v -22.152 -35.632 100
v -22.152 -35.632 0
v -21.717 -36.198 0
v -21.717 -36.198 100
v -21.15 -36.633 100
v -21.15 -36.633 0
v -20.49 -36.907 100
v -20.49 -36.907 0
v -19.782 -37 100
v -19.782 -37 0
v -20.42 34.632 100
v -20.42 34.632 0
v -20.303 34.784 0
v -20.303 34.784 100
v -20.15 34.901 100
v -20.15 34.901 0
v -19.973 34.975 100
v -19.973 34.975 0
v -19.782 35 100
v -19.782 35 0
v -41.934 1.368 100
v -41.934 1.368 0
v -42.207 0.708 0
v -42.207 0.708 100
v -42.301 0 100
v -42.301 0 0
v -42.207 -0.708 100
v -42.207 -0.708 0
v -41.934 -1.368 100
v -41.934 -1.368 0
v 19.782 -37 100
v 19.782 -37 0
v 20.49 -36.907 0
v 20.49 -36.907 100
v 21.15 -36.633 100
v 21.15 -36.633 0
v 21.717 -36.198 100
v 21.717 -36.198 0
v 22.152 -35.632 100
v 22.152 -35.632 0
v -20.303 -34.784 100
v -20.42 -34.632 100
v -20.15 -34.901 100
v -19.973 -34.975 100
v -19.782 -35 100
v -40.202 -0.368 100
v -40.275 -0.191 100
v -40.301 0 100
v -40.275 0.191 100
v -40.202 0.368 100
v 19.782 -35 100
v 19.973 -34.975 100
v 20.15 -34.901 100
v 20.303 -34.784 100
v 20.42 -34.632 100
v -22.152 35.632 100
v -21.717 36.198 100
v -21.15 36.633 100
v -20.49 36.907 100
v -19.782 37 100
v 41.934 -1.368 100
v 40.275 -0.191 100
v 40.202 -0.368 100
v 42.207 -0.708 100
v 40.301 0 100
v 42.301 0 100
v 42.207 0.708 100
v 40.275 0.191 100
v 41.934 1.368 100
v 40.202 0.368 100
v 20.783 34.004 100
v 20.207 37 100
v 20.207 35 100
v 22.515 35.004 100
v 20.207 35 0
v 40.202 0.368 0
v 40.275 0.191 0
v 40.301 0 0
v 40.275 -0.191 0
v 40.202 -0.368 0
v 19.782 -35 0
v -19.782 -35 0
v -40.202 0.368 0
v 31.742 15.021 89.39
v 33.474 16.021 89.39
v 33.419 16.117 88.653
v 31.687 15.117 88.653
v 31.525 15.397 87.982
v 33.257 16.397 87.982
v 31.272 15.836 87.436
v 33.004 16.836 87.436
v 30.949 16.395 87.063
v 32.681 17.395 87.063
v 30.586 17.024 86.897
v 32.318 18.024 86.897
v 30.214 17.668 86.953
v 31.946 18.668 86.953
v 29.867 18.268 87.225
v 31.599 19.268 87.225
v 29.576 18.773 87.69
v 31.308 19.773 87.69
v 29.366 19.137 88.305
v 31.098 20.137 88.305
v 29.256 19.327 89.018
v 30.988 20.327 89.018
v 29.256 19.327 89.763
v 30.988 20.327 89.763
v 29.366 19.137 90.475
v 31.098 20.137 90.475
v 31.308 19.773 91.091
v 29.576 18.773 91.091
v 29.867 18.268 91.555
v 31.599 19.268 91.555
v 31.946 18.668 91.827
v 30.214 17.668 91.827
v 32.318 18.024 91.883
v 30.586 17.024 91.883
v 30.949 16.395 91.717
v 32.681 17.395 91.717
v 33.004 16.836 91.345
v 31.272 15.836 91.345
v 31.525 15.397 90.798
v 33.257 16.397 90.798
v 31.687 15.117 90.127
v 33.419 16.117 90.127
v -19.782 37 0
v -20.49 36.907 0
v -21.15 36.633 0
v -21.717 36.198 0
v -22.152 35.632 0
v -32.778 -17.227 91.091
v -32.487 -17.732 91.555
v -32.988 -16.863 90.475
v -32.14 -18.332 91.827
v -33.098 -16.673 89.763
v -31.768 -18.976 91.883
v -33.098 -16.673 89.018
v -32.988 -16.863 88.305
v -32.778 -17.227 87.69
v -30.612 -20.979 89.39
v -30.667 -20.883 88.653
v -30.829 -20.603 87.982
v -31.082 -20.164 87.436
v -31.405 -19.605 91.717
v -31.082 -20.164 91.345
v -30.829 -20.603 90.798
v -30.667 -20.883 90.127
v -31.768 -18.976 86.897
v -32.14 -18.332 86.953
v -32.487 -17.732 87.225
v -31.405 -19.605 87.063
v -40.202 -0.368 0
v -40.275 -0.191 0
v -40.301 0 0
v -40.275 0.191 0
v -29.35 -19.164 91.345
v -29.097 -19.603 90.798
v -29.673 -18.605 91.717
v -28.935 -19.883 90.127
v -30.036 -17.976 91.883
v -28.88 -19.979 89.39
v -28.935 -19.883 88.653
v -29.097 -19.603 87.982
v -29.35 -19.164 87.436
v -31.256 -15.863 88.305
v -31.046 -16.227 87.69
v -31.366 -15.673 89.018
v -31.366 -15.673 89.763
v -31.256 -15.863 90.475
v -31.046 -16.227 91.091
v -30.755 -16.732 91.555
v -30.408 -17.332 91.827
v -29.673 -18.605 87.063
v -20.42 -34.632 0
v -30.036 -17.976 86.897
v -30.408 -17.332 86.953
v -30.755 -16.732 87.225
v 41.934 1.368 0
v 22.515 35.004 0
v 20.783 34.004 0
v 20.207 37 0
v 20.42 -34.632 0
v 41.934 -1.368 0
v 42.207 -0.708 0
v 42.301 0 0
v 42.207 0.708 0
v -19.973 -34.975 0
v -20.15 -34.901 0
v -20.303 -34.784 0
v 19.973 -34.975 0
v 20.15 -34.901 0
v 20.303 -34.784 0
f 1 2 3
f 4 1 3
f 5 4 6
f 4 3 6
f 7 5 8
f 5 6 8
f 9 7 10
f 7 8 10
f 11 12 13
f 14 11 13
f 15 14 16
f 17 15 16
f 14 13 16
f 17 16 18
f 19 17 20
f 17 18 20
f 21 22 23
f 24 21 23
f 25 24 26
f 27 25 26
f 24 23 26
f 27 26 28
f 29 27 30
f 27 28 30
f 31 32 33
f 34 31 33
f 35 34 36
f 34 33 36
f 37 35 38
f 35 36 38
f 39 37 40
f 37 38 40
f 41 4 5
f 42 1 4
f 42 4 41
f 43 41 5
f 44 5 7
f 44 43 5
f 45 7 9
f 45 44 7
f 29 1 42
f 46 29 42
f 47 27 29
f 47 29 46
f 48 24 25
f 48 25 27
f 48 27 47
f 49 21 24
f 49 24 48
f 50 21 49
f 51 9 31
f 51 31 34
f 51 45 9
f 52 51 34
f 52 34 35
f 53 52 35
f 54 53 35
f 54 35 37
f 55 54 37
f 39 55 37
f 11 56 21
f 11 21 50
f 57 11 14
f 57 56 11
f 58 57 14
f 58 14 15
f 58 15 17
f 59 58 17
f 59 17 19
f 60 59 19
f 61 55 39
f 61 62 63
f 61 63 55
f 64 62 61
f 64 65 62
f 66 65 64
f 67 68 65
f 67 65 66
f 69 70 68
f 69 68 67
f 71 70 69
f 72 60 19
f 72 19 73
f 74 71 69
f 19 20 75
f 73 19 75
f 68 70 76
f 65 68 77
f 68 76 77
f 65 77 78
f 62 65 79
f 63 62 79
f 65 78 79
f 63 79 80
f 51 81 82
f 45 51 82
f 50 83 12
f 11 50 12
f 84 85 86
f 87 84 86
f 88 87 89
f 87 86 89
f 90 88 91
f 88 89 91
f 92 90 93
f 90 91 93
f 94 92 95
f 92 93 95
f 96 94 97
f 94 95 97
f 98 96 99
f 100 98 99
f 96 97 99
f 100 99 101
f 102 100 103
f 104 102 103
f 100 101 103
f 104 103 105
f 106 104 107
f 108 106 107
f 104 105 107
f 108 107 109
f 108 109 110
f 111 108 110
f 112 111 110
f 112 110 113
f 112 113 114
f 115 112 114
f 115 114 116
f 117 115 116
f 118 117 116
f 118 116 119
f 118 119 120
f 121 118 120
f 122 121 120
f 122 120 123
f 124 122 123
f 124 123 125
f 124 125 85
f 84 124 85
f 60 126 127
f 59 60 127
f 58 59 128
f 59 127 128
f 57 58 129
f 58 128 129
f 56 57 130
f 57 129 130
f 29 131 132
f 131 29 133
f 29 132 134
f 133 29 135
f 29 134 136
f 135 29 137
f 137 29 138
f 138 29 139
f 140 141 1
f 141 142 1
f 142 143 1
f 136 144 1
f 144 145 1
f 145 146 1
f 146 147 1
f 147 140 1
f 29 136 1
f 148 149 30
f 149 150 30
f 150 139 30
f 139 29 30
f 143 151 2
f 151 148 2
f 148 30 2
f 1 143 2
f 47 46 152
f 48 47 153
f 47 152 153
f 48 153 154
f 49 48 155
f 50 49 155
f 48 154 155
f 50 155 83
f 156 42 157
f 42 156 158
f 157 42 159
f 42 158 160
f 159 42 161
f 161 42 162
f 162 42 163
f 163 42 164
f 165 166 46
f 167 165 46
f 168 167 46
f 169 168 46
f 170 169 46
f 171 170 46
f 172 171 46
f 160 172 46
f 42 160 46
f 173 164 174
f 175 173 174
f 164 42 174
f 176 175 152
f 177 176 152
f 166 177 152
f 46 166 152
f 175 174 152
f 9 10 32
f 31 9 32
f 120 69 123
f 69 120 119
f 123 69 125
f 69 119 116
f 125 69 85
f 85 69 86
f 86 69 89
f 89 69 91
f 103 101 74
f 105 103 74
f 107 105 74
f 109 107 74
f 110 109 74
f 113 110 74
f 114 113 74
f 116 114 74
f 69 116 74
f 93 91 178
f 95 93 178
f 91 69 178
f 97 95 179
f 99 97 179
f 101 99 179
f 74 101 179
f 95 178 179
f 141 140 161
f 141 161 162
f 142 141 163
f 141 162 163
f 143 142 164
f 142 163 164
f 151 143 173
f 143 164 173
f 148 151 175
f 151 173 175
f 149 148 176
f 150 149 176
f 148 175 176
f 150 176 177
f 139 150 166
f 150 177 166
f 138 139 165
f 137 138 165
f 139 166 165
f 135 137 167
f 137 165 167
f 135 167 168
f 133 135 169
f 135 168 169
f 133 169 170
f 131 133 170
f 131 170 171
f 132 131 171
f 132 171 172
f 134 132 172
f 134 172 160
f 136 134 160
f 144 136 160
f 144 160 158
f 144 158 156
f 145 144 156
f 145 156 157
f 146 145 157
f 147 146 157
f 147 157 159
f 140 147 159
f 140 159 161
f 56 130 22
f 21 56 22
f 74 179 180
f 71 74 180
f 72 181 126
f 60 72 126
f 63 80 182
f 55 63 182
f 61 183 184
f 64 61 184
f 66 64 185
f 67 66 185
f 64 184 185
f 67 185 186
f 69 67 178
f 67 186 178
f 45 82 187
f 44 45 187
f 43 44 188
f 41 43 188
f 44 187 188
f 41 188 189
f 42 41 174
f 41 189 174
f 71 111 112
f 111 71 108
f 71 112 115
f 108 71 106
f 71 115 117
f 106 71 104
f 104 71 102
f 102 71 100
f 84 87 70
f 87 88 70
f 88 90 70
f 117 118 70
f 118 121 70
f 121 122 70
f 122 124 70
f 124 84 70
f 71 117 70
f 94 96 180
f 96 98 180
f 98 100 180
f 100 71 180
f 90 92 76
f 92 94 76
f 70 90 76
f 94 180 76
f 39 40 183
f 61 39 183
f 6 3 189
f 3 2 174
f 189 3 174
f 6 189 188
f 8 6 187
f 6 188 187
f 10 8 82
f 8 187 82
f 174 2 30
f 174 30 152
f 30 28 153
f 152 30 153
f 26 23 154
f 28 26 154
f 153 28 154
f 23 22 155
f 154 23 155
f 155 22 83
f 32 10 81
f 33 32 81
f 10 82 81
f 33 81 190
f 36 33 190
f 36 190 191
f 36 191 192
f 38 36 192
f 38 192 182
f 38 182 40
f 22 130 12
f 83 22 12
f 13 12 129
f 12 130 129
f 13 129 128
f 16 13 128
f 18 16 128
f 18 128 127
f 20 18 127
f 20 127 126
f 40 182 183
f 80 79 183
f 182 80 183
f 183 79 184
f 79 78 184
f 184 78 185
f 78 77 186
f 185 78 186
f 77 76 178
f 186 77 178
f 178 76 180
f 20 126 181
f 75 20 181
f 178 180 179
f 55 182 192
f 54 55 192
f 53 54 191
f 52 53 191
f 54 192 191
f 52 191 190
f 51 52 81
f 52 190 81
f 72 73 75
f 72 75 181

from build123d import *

# Parameters (mm, degrees)
LOFTED_BENDS1_DEPTH = 100
SKETCH11_R          = 2.5
CUT_EXTRUDE1_DEPTH  = 137.408236331


# Read off the part's stored shape, not the designer's step: Lofted Bends1
with BuildPart() as part:
    # Lofted Bends1 outline → Lofted Bends1 (new body)
    with BuildSketch(Plane.XY):
        with BuildLine():
            Line((20.207259422, 35), (20.207259422, 37))
            Line((20.207259422, 37), (-19.781983213, 37))
            ThreePointArc((-19.781983213, 37), (-21.150283213, 36.63336512), (-22.151948333, 35.6317))
            Line((-22.151948333, 35.6317), (-41.933931547, 1.3683))
            ThreePointArc((-41.933931547, 1.3683), (-42.300566427, 0), (-41.933931547, -1.3683))
            Line((-41.933931547, -1.3683), (-22.151948333, -35.6317))
            ThreePointArc((-22.151948333, -35.6317), (-21.150283213, -36.63336512), (-19.781983213, -37))
            Line((-19.781983213, -37), (19.781983213, -37))
            ThreePointArc((19.781983213, -37), (21.150283213, -36.63336512), (22.151948333, -35.6317))
            Line((22.151948333, -35.6317), (41.933931547, -1.3683))
            ThreePointArc((41.933931547, -1.3683), (42.300566427, 0), (41.933931547, 1.3683))
            Line((41.933931547, 1.3683), (22.514616839, 35.003539722))
            Line((22.514616839, 35.003539722), (20.782566032, 34.003539722))
            Line((20.782566032, 34.003539722), (40.201880739, 0.3683))
            ThreePointArc((40.201880739, 0.3683), (40.300566427, 0), (40.201880739, -0.3683))
            Line((40.201880739, -0.3683), (20.419897526, -34.6317))
            ThreePointArc((20.419897526, -34.6317), (20.150283213, -34.901314312), (19.781983213, -35))
            Line((19.781983213, -35), (-19.781983213, -35))
            ThreePointArc((-19.781983213, -35), (-20.150283213, -34.901314312), (-20.419897526, -34.6317))
            Line((-20.419897526, -34.6317), (-40.201880739, -0.3683))
            ThreePointArc((-40.201880739, -0.3683), (-40.300566427, 0), (-40.201880739, 0.3683))
            Line((-40.201880739, 0.3683), (-20.419897526, 34.6317))
            ThreePointArc((-20.419897526, 34.6317), (-20.150283213, 34.901314312), (-19.781983213, 35))
            Line((-19.781983213, 35), (20.207259422, 35))
        make_face()
    extrude(amount=LOFTED_BENDS1_DEPTH)

    # Sketch11 → Cut-Extrude1 (cut, through all)
    with BuildSketch(Plane(origin=(32.04293994, 18.5, 0), x_dir=(0, 0, -1), z_dir=(0.8660254037844385, 0.5000000000000004, 0))):
        with Locations(Location((-89.390171196, -0.362668506, 0), (0, 0, 270))):
            Circle(SKETCH11_R)
    extrude(amount=-CUT_EXTRUDE1_DEPTH, mode=Mode.SUBTRACT)


solid = part.part
